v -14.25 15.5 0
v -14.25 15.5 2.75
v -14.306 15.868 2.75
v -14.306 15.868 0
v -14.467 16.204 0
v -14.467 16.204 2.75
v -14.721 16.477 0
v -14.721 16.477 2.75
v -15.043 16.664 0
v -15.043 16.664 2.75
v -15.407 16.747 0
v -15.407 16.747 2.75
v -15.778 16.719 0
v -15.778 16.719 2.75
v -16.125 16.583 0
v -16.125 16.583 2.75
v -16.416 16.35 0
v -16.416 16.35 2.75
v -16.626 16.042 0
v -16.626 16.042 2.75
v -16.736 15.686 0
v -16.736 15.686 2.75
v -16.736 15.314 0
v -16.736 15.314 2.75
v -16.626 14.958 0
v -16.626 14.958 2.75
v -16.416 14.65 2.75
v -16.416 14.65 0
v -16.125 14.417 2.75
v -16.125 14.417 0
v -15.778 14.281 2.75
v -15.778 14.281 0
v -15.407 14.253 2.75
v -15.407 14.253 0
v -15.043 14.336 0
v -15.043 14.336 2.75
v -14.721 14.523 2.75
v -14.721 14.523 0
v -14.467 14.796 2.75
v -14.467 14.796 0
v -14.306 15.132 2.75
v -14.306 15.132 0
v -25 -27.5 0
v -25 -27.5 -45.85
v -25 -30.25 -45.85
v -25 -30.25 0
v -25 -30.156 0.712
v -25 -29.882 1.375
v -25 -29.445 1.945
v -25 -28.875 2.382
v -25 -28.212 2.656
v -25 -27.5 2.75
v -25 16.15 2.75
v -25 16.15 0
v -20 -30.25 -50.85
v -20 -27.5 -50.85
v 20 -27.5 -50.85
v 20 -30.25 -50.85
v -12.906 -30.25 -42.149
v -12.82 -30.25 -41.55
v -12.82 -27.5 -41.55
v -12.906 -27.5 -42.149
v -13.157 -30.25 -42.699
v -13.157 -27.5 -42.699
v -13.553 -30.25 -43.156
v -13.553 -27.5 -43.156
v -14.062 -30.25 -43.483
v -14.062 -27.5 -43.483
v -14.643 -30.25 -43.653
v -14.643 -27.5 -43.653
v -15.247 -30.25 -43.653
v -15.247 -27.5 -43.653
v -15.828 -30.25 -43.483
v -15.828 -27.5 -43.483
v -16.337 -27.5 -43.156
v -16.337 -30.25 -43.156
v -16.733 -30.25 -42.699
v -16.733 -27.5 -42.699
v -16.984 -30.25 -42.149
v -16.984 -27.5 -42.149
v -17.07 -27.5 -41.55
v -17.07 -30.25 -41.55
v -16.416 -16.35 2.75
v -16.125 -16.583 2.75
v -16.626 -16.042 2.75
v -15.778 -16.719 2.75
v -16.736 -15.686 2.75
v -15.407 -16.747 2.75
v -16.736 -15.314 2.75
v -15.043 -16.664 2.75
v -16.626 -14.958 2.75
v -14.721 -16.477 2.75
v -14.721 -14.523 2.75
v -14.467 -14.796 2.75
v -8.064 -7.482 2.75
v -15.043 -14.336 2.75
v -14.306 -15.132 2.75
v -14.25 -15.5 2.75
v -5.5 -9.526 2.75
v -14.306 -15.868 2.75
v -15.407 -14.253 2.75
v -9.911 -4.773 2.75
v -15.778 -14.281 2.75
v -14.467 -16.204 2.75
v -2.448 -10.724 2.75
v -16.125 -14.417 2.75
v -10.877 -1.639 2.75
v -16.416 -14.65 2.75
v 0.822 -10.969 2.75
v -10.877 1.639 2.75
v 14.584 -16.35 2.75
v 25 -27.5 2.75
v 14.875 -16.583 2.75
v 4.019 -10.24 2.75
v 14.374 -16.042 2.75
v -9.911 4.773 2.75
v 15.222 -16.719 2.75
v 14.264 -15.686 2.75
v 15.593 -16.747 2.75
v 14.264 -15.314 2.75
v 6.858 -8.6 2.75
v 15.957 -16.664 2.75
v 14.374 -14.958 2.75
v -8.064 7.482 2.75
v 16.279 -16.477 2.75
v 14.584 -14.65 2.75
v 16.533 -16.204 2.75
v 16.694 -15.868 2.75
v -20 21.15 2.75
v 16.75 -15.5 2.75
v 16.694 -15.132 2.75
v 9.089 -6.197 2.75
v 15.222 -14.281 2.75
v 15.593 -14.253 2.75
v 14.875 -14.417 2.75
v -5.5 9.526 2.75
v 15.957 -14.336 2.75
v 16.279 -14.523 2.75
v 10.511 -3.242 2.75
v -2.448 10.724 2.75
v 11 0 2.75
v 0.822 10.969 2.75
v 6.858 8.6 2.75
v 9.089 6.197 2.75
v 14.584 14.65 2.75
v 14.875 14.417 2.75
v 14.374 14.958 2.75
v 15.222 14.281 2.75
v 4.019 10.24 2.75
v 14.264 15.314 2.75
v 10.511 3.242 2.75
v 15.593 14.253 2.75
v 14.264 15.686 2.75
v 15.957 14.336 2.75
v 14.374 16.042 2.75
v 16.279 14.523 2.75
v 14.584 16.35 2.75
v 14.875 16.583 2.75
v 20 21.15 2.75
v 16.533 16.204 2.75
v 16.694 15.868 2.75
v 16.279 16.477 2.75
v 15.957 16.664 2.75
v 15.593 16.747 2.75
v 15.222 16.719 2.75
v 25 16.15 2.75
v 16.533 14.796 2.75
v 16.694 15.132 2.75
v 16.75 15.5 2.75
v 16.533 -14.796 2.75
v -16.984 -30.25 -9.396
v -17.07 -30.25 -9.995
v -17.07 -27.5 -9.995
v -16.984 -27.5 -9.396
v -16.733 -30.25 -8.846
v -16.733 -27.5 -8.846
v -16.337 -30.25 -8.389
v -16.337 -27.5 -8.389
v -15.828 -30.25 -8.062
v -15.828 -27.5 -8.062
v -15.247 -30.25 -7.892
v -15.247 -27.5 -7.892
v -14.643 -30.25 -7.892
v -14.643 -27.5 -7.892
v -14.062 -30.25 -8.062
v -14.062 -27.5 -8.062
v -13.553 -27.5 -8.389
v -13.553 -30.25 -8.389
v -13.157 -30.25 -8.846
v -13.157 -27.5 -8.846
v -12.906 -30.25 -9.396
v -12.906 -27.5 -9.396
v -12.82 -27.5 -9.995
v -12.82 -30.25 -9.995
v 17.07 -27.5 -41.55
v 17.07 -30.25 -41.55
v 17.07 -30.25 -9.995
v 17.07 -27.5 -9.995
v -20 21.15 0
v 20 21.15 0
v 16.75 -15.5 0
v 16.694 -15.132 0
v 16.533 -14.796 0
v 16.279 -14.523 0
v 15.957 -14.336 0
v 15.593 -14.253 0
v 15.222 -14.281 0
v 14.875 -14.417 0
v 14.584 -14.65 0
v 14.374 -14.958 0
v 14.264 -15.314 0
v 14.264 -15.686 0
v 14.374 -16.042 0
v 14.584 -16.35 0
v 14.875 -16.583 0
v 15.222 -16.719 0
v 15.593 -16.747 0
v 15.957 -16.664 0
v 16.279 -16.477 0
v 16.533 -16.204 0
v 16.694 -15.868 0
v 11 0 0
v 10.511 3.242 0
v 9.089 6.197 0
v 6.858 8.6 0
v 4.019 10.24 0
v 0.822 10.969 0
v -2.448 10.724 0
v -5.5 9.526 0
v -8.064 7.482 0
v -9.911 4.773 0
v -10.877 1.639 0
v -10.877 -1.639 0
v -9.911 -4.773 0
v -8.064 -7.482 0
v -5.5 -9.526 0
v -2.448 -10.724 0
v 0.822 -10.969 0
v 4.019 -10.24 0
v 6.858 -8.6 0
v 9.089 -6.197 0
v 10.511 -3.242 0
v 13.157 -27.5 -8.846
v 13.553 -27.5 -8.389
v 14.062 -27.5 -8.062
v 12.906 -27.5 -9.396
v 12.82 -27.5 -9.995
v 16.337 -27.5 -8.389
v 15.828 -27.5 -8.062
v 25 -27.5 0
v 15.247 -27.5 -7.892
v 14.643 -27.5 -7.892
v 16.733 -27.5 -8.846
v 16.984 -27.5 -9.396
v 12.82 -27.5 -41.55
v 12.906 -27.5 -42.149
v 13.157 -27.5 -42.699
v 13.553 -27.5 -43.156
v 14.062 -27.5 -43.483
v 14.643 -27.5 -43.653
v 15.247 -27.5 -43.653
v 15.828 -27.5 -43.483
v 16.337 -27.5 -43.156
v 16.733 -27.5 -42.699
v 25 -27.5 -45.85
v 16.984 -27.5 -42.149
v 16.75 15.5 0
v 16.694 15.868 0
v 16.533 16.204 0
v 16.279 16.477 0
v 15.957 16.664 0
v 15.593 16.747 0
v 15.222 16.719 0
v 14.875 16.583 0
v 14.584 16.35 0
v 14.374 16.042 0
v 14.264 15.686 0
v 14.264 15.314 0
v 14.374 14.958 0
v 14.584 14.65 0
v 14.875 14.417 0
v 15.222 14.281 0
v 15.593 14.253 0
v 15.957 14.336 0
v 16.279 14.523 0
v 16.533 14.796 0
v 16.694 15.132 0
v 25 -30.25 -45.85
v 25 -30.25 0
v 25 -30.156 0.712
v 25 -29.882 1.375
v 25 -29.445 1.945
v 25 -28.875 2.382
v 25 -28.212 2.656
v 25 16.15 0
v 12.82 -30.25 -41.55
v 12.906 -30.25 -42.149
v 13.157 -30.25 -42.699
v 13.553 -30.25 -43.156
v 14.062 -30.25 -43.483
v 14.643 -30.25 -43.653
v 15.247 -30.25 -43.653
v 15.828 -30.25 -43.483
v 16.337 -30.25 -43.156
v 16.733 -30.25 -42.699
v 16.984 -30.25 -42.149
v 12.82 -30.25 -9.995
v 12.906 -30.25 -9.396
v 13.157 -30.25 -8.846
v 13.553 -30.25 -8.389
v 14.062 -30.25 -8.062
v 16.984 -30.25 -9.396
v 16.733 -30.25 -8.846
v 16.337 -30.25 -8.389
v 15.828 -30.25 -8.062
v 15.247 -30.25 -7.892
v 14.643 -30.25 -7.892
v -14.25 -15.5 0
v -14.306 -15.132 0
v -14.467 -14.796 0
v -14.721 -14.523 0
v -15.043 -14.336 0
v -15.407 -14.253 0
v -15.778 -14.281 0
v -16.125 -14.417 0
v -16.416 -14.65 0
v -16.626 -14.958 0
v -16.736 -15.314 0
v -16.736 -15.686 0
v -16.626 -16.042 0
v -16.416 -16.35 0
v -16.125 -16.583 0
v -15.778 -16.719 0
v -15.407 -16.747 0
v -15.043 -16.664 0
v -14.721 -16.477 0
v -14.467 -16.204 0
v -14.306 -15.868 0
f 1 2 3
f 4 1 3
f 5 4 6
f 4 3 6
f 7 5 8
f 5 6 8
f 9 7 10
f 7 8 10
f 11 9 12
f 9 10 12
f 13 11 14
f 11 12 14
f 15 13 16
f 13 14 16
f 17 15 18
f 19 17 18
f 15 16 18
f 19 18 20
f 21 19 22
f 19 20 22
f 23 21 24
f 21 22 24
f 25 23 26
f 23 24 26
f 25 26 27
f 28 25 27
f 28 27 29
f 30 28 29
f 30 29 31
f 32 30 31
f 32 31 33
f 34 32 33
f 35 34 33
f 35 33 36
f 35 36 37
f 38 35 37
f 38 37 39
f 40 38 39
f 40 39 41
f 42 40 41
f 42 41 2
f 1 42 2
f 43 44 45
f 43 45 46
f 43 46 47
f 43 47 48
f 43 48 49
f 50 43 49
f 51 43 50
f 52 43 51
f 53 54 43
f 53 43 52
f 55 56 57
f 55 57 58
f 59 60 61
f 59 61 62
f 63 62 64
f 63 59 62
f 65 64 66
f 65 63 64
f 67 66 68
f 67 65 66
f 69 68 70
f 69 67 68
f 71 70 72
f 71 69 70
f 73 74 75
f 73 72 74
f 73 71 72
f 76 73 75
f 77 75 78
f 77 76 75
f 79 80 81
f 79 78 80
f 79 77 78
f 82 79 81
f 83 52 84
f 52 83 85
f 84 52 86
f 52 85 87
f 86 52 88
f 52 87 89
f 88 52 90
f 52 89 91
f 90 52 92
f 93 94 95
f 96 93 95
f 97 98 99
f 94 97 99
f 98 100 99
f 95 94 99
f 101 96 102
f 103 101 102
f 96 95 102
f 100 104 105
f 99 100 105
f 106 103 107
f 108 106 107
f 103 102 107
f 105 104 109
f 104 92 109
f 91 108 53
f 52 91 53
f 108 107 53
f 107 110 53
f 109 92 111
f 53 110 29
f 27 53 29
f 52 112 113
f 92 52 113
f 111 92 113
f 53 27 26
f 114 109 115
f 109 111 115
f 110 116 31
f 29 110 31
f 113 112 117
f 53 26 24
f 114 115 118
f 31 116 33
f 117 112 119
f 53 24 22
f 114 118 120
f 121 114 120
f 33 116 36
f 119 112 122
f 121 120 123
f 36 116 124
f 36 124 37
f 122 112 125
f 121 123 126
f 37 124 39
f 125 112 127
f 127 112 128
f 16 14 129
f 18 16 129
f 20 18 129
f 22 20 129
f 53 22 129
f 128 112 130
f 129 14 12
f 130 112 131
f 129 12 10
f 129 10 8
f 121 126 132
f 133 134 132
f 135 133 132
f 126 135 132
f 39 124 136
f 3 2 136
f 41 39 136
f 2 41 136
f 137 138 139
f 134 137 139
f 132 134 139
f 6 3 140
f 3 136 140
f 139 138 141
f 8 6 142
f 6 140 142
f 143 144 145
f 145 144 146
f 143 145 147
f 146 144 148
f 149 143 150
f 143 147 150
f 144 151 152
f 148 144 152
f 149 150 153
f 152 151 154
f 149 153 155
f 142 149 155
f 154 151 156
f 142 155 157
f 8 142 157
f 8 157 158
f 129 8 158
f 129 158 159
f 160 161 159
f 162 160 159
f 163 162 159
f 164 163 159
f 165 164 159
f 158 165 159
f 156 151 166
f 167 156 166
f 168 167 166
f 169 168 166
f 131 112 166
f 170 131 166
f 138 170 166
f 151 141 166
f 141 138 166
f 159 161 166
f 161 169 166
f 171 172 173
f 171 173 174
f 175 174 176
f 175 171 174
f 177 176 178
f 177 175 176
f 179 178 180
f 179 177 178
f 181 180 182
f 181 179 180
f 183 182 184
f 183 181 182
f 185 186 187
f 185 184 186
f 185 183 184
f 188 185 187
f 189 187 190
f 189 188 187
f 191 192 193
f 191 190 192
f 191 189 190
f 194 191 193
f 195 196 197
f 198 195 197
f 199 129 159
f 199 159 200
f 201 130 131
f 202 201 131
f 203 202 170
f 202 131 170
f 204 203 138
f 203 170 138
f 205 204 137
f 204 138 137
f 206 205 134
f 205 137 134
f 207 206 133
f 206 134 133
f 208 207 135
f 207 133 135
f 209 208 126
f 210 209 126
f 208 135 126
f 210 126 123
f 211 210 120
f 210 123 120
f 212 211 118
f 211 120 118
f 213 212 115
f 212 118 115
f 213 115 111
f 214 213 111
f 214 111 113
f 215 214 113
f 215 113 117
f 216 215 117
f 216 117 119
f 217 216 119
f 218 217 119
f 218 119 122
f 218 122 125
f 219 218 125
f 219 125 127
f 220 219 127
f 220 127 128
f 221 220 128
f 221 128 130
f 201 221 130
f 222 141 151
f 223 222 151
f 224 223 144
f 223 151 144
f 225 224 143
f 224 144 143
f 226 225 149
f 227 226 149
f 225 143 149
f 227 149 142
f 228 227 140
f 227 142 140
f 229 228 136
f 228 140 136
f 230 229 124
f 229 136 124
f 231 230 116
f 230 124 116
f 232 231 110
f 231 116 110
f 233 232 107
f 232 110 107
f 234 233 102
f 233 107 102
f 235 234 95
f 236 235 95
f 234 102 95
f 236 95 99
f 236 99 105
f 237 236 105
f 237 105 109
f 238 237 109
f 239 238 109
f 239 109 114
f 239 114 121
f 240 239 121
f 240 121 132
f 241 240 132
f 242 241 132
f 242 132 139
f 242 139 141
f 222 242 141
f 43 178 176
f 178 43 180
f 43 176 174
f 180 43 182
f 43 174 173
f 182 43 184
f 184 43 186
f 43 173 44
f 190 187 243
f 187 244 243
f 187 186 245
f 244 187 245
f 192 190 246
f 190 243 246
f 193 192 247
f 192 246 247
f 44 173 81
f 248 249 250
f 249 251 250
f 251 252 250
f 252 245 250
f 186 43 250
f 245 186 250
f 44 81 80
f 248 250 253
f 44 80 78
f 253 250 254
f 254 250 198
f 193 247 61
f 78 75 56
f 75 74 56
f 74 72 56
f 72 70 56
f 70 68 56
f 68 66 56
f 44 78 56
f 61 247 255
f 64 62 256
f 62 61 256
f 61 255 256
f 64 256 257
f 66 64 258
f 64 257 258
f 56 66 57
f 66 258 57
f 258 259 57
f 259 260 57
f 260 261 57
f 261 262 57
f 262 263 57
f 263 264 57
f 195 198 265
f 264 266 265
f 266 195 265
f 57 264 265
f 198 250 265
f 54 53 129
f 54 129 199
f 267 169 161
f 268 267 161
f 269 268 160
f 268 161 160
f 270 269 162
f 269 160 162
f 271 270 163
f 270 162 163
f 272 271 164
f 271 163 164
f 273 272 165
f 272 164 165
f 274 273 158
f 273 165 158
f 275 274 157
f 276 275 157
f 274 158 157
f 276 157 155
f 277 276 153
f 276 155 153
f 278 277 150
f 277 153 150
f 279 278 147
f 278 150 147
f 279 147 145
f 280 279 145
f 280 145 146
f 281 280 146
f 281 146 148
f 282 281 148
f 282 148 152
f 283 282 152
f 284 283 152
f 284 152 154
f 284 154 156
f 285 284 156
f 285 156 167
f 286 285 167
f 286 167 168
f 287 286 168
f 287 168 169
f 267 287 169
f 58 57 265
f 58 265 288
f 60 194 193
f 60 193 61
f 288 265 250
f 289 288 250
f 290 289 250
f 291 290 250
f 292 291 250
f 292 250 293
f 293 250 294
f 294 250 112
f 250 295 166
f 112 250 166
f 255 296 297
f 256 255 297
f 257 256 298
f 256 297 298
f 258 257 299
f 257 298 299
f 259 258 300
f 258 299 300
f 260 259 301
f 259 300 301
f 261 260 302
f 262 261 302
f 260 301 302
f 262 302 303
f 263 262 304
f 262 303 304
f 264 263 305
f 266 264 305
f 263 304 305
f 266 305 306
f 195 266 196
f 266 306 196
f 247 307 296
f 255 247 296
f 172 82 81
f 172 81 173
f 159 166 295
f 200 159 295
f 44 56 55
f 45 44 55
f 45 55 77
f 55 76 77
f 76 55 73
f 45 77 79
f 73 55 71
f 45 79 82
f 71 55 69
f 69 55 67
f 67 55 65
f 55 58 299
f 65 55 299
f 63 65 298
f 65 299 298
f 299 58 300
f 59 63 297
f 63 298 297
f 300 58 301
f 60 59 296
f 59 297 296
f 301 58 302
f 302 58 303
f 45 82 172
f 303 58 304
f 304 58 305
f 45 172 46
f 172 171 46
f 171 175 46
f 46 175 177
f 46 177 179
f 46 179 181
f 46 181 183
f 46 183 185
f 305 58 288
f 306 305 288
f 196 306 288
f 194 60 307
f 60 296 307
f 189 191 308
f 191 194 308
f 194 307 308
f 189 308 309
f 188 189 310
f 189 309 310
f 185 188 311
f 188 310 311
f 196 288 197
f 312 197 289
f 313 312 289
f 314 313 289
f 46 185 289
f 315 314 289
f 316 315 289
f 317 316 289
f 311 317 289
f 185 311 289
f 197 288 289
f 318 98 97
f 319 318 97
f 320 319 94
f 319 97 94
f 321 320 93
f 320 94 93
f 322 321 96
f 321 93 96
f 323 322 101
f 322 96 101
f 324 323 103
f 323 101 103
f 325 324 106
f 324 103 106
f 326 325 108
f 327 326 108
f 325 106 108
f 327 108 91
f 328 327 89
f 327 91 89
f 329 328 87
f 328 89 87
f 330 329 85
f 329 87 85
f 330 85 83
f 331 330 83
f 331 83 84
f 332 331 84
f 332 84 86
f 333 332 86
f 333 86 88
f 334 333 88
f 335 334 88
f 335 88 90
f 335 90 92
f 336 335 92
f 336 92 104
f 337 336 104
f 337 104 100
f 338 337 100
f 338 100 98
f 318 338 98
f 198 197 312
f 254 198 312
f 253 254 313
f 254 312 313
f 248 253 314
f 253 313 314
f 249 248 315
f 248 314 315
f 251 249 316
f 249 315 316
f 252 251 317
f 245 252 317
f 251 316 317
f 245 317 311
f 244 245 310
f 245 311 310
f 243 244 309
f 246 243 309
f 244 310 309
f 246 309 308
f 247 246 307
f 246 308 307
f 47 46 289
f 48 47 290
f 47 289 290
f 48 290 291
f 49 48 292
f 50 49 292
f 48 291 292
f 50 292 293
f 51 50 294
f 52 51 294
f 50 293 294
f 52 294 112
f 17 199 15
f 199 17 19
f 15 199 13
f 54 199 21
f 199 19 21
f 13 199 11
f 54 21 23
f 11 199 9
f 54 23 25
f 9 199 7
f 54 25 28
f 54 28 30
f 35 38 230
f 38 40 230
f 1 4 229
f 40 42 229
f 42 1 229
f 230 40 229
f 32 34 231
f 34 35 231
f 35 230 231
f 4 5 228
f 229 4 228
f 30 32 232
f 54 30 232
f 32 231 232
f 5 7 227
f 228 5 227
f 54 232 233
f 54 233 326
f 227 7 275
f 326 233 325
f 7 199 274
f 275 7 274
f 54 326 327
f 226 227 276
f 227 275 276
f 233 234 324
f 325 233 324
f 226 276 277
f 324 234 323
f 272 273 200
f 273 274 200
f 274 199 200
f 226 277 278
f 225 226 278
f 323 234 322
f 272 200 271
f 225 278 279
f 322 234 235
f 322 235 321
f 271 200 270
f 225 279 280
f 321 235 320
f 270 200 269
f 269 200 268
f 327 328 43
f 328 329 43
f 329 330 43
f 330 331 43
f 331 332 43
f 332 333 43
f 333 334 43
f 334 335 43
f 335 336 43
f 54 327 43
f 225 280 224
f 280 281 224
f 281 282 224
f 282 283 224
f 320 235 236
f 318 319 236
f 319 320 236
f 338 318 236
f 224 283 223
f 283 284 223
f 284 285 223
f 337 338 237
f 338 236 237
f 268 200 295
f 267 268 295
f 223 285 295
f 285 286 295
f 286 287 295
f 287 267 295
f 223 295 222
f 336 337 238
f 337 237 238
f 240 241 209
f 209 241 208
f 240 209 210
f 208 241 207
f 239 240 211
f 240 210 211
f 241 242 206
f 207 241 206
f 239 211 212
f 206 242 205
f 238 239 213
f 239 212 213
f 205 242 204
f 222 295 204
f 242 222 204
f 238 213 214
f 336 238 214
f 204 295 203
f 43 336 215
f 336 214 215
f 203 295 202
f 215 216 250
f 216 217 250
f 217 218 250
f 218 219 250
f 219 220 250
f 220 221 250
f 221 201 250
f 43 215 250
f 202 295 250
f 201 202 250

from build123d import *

# Parameters (mm, degrees)
BOSS_EXTRUDE1_DEPTH = 25
SKETCH5_R           = 1.25
SKETCH5_R_2         = 11
CUT_EXTRUDE1_DEPTH  = 67.430584071
CUT_EXTRUDE2_DEPTH  = 77.502826745
CHAMFER1_SIZE       = 5


with BuildPart() as part:
    # Sketch4 → Boss-Extrude1 (new, symmetric)
    with BuildSketch(Plane(origin=(0, 0, 0), x_dir=(0, 0, -1), z_dir=(1, 0, 0))):
        with BuildLine():
            Line((0, 21.15), (0, -27.5))
            Line((0, -27.5), (50.85, -27.5))
            Line((50.85, -27.5), (50.85, -30.25))
            Line((50.85, -30.25), (0, -30.25))
            ThreePointArc((0, -30.25), (-1.944543648, -29.444543648), (-2.75, -27.5))
            Line((-2.75, -27.5), (-2.75, 21.15))
            Line((-2.75, 21.15), (0, 21.15))
        make_face()
    extrude(amount=BOSS_EXTRUDE1_DEPTH, both=True)

    # Sketch5 → Cut-Extrude1 (cut, through all)
    with BuildSketch(Plane.XY.offset(2.75)):
        with Locations((-15.5, -15.5)):
            Circle(SKETCH5_R)
        with Locations((-15.5, 15.5)):
            Circle(SKETCH5_R)
        with Locations((15.5, 15.5)):
            Circle(SKETCH5_R)
        with Locations((15.5, -15.5)):
            Circle(SKETCH5_R)
        Circle(SKETCH5_R_2)
    extrude(amount=-CUT_EXTRUDE1_DEPTH, mode=Mode.SUBTRACT)

    # Sketch6 → Cut-Extrude2 (cut, through all)
    with BuildSketch(Plane.XZ.offset(30.25)):
        with BuildLine():
            Line((-12.82, -9.995), (-12.82, -41.55))
            ThreePointArc((-12.82, -41.55), (-14.945, -43.675), (-17.07, -41.55))
            Line((-17.07, -41.55), (-17.07, -9.995))
            ThreePointArc((-17.07, -9.995), (-14.945, -7.87), (-12.82, -9.995))
        make_face()
        with BuildLine():
            Line((12.82, -9.995), (12.82, -41.55))
            ThreePointArc((12.82, -41.55), (14.945, -43.675), (17.07, -41.55))
            Line((17.07, -41.55), (17.07, -9.995))
            ThreePointArc((17.07, -9.995), (14.945, -7.87), (12.82, -9.995))
        make_face()
    extrude(amount=-CUT_EXTRUDE2_DEPTH, mode=Mode.SUBTRACT)

    # Chamfer1
    chamfer1_edges = [part.edges().sort_by_distance(p)[0] for p in [
        (25, -28.875, -50.85),
        (25, 21.15, 1.375),
        (-25, -28.875, -50.85),
        (-25, 21.15, 1.375),
    ]]
    chamfer(chamfer1_edges, length=CHAMFER1_SIZE)


solid = part.part
